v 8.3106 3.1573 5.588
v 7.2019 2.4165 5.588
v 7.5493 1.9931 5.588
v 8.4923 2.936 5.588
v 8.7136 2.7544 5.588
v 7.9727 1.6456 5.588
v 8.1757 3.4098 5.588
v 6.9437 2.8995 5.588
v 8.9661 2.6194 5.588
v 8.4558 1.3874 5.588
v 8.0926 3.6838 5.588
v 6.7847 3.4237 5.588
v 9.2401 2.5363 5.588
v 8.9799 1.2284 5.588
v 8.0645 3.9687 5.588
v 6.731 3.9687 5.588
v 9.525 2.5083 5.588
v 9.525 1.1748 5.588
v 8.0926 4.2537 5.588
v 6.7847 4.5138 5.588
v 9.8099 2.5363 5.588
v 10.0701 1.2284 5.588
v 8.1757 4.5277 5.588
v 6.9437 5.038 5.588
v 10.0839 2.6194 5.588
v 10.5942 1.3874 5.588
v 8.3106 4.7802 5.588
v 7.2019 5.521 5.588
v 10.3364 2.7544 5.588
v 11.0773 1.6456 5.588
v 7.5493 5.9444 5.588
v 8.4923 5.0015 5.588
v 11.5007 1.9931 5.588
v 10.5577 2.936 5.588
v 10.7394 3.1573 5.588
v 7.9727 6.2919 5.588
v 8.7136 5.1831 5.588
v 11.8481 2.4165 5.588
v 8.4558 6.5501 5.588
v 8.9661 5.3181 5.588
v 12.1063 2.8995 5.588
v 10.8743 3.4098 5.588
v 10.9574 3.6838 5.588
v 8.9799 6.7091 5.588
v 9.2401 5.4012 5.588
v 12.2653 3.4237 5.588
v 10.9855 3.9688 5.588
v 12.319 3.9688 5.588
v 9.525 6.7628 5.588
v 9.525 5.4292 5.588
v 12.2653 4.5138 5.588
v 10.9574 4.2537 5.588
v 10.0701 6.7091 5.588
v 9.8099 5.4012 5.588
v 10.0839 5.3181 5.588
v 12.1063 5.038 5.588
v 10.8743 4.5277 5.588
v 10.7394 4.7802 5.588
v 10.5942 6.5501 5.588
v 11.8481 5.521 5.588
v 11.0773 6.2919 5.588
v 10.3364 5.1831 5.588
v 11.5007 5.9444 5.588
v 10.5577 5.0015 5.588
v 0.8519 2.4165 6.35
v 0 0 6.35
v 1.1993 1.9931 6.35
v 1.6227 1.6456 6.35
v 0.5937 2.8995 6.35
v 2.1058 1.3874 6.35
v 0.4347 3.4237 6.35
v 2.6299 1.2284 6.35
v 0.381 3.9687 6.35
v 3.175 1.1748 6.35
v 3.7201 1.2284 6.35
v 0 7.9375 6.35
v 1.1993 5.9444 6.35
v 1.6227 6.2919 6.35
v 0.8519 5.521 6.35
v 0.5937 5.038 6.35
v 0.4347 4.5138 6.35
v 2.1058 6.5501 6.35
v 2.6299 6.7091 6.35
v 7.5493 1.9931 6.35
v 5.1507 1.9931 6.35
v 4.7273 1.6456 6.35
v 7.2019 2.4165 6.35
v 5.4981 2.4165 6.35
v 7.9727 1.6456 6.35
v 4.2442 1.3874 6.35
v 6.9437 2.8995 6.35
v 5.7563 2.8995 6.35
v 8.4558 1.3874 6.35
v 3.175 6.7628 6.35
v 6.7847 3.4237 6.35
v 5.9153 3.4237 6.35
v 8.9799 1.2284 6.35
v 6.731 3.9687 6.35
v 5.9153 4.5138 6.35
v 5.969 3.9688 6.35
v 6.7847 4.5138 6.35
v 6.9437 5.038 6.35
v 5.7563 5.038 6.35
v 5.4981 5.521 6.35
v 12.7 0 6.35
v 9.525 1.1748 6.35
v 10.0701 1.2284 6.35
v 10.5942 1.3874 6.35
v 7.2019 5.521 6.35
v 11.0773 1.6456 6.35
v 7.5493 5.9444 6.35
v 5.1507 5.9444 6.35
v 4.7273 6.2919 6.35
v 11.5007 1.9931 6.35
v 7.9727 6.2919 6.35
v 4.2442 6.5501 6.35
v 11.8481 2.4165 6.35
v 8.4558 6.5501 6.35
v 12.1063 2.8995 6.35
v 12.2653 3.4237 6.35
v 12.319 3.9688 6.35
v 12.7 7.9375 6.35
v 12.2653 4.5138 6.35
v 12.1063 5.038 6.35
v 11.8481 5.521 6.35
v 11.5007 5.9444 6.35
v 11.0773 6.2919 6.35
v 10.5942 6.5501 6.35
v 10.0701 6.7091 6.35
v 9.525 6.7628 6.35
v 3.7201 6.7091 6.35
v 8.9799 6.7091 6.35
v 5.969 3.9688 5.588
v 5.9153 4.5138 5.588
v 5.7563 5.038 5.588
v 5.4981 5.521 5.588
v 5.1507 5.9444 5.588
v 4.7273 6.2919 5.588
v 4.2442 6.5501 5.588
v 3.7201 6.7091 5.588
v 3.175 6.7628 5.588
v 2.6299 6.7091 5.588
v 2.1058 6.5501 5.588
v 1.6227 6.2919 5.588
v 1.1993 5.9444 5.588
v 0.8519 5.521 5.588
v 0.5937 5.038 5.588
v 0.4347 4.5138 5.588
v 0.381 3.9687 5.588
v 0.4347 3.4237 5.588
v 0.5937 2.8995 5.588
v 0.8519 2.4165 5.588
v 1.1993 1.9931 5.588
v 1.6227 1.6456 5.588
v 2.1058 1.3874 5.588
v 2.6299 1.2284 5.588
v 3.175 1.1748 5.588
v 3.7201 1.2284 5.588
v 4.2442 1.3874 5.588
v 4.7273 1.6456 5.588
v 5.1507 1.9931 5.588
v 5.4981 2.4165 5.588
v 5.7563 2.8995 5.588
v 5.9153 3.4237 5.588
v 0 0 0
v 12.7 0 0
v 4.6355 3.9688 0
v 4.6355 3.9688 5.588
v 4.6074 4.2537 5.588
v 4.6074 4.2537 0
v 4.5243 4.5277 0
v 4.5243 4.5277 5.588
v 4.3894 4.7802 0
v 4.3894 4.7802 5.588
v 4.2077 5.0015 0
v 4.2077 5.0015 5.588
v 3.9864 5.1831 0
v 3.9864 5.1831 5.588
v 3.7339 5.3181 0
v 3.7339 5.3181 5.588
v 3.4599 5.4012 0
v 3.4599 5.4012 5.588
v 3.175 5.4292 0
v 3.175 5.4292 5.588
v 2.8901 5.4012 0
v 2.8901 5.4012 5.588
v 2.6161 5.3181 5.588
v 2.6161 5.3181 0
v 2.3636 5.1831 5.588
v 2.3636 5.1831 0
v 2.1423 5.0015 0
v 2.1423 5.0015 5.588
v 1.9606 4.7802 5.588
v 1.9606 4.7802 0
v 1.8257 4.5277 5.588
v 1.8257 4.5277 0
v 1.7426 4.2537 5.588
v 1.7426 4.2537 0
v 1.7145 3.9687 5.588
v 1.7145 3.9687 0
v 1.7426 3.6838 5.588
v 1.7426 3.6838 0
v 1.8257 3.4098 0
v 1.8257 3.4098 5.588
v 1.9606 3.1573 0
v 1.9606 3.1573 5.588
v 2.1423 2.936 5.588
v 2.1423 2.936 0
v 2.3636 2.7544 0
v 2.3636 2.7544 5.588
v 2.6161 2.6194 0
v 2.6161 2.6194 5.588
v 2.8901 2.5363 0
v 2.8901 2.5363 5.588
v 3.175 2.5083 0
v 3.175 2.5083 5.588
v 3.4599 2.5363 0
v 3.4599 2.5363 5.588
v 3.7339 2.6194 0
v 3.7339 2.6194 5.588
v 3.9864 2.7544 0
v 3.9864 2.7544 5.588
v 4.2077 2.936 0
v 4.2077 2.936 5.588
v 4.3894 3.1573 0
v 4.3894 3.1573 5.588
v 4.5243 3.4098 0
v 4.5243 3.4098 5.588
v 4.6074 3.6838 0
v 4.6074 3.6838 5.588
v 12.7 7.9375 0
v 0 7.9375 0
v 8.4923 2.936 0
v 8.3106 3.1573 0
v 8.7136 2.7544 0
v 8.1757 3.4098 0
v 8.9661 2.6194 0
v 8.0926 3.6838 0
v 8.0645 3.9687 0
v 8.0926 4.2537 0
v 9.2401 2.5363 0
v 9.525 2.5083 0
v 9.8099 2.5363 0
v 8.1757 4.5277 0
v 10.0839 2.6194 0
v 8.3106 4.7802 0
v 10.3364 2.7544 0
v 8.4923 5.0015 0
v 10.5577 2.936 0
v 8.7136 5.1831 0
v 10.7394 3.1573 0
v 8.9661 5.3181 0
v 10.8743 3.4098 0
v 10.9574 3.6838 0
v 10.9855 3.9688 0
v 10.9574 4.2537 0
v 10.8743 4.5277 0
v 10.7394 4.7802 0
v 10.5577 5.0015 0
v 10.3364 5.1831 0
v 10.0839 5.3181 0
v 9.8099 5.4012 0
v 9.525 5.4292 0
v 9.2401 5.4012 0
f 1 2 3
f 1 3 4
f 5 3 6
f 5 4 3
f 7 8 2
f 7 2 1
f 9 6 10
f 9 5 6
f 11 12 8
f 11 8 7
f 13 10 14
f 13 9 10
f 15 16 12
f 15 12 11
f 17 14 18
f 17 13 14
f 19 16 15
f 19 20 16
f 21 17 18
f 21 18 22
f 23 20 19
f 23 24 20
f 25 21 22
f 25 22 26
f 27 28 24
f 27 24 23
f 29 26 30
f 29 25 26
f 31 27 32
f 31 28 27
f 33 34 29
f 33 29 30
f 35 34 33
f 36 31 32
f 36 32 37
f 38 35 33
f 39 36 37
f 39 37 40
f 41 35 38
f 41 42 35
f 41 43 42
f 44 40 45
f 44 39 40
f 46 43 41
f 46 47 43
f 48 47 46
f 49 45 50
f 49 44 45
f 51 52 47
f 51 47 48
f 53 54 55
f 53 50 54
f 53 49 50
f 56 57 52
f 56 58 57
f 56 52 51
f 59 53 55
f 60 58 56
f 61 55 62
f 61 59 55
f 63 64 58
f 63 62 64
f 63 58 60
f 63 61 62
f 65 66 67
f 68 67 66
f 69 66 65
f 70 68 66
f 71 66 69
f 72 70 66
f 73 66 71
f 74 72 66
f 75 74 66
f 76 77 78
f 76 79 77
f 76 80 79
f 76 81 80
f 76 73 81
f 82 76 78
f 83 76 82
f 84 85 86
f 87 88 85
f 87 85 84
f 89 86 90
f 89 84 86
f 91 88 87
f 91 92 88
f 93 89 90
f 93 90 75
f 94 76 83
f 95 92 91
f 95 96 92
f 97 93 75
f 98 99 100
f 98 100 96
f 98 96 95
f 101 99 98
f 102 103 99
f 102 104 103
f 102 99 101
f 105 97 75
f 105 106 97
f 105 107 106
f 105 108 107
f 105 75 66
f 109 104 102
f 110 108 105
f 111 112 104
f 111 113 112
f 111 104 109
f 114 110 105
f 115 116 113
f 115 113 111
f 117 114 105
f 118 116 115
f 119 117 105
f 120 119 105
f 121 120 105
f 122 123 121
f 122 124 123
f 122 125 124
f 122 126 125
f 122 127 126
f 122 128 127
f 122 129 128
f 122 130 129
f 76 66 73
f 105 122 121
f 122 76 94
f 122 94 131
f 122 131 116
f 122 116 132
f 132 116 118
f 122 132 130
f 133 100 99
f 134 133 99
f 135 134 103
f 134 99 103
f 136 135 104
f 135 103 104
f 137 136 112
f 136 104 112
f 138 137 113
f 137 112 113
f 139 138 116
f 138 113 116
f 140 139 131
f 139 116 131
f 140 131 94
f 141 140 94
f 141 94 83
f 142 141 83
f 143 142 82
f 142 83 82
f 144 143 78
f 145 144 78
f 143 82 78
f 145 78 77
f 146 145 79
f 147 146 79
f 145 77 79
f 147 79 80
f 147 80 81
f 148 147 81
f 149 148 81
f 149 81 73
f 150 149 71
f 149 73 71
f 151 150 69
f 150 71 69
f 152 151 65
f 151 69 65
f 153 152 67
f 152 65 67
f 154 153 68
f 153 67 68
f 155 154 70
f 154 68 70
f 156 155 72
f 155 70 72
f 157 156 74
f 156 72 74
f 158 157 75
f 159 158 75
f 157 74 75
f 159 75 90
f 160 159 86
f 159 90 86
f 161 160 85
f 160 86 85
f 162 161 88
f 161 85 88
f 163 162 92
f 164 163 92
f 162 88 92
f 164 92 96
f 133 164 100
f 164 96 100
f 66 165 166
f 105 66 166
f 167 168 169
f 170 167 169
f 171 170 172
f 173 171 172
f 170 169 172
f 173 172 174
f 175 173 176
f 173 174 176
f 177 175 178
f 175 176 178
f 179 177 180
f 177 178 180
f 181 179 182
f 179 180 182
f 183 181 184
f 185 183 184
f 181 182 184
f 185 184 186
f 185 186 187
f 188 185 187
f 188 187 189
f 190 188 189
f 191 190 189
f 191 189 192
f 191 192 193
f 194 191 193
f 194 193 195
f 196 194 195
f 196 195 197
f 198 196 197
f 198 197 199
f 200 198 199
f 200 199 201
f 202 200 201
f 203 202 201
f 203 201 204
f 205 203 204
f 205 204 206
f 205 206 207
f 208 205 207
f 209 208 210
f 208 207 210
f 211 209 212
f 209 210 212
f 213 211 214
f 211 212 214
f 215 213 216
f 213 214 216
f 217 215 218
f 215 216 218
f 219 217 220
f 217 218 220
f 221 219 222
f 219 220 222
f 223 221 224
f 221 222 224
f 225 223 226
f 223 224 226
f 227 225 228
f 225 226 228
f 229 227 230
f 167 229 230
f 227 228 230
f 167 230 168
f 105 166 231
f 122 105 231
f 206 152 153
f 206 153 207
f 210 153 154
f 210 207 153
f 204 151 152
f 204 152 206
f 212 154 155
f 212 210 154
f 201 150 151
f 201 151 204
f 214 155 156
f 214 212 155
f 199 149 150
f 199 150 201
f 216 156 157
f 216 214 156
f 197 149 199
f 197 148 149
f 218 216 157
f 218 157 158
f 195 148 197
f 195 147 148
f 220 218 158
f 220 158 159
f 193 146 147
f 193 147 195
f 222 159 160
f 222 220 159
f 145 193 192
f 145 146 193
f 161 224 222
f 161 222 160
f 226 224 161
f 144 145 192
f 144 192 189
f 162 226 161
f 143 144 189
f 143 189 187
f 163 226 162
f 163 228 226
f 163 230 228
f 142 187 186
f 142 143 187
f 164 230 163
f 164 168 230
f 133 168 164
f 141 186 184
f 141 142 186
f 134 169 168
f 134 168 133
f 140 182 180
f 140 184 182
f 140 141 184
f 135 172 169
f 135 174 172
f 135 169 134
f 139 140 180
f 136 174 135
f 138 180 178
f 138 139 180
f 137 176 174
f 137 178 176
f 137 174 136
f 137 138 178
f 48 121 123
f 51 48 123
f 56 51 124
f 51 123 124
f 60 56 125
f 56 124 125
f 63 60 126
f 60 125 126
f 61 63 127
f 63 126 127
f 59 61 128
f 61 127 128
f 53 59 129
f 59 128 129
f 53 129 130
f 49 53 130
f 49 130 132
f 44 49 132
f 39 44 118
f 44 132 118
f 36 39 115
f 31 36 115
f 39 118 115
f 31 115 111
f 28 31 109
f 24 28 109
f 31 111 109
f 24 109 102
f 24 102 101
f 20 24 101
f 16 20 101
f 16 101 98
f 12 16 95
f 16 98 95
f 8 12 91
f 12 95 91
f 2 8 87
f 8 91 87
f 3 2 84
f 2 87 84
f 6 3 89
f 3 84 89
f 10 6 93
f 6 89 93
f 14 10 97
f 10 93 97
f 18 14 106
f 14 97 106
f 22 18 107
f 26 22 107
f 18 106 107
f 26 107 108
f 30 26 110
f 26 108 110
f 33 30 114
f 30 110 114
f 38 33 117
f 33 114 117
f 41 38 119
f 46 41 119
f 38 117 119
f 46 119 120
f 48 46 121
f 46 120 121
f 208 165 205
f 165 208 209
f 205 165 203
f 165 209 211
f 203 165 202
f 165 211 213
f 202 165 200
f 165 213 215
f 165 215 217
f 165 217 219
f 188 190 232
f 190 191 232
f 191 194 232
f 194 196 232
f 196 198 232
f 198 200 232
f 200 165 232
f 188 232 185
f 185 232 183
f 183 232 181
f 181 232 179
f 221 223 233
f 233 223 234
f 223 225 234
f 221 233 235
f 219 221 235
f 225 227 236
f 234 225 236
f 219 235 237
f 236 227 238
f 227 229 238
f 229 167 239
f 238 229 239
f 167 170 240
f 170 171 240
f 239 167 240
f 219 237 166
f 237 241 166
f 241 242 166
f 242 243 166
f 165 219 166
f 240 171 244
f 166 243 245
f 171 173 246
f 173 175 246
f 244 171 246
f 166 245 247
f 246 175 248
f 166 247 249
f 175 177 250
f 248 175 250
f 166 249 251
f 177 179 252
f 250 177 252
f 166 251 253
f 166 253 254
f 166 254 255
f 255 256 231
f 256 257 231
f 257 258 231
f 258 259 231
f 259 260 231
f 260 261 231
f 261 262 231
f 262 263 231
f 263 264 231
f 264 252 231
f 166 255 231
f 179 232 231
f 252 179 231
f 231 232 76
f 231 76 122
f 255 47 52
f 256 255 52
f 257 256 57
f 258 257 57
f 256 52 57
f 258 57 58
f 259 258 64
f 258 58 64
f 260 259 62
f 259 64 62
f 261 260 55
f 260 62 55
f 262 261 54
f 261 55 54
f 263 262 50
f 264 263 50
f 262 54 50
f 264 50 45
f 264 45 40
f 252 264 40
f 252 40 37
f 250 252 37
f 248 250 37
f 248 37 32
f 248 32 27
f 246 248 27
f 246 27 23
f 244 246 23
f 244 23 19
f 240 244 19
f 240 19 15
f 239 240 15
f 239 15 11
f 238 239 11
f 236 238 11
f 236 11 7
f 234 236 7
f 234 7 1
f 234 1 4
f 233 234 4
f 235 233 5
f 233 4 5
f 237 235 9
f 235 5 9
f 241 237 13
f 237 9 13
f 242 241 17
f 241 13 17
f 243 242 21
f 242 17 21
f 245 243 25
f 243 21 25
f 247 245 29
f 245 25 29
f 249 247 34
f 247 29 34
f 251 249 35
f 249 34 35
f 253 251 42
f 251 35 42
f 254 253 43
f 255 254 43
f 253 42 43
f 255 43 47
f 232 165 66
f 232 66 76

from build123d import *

# Parameters (mm, degrees)
SKETCH1_W           = 12.7
SKETCH1_H           = 7.9375
BOSS_EXTRUDE1_DEPTH = 6.35
SKETCH2_R           = 2.794
CUT_EXTRUDE1_DEPTH  = 0.762
SKETCH3_R           = 1.4605
CUT_EXTRUDE2_DEPTH  = 16.984982022


with BuildPart() as part:
    # Sketch1 → Boss-Extrude1 (new body)
    with BuildSketch(Plane.XY):
        with Locations((6.35, 3.96875)):
            Rectangle(SKETCH1_W, SKETCH1_H)
    extrude(amount=BOSS_EXTRUDE1_DEPTH)

    # Sketch2 → Cut-Extrude1 (cut)
    with BuildSketch(Plane.XY.offset(6.35)):
        with Locations((3.175, 3.96875)):
            Circle(SKETCH2_R)
        with Locations((9.525, 3.96875)):
            Circle(SKETCH2_R)
    extrude(amount=-CUT_EXTRUDE1_DEPTH, mode=Mode.SUBTRACT)

    # Sketch3 → Cut-Extrude2 (cut, through all)
    with BuildSketch(Plane.XY.offset(5.588)):
        with Locations((3.175, 3.96875)):
            Circle(SKETCH3_R)
        with Locations((9.525, 3.96875)):
            Circle(SKETCH3_R)
    extrude(amount=-CUT_EXTRUDE2_DEPTH, mode=Mode.SUBTRACT)


solid = part.part
